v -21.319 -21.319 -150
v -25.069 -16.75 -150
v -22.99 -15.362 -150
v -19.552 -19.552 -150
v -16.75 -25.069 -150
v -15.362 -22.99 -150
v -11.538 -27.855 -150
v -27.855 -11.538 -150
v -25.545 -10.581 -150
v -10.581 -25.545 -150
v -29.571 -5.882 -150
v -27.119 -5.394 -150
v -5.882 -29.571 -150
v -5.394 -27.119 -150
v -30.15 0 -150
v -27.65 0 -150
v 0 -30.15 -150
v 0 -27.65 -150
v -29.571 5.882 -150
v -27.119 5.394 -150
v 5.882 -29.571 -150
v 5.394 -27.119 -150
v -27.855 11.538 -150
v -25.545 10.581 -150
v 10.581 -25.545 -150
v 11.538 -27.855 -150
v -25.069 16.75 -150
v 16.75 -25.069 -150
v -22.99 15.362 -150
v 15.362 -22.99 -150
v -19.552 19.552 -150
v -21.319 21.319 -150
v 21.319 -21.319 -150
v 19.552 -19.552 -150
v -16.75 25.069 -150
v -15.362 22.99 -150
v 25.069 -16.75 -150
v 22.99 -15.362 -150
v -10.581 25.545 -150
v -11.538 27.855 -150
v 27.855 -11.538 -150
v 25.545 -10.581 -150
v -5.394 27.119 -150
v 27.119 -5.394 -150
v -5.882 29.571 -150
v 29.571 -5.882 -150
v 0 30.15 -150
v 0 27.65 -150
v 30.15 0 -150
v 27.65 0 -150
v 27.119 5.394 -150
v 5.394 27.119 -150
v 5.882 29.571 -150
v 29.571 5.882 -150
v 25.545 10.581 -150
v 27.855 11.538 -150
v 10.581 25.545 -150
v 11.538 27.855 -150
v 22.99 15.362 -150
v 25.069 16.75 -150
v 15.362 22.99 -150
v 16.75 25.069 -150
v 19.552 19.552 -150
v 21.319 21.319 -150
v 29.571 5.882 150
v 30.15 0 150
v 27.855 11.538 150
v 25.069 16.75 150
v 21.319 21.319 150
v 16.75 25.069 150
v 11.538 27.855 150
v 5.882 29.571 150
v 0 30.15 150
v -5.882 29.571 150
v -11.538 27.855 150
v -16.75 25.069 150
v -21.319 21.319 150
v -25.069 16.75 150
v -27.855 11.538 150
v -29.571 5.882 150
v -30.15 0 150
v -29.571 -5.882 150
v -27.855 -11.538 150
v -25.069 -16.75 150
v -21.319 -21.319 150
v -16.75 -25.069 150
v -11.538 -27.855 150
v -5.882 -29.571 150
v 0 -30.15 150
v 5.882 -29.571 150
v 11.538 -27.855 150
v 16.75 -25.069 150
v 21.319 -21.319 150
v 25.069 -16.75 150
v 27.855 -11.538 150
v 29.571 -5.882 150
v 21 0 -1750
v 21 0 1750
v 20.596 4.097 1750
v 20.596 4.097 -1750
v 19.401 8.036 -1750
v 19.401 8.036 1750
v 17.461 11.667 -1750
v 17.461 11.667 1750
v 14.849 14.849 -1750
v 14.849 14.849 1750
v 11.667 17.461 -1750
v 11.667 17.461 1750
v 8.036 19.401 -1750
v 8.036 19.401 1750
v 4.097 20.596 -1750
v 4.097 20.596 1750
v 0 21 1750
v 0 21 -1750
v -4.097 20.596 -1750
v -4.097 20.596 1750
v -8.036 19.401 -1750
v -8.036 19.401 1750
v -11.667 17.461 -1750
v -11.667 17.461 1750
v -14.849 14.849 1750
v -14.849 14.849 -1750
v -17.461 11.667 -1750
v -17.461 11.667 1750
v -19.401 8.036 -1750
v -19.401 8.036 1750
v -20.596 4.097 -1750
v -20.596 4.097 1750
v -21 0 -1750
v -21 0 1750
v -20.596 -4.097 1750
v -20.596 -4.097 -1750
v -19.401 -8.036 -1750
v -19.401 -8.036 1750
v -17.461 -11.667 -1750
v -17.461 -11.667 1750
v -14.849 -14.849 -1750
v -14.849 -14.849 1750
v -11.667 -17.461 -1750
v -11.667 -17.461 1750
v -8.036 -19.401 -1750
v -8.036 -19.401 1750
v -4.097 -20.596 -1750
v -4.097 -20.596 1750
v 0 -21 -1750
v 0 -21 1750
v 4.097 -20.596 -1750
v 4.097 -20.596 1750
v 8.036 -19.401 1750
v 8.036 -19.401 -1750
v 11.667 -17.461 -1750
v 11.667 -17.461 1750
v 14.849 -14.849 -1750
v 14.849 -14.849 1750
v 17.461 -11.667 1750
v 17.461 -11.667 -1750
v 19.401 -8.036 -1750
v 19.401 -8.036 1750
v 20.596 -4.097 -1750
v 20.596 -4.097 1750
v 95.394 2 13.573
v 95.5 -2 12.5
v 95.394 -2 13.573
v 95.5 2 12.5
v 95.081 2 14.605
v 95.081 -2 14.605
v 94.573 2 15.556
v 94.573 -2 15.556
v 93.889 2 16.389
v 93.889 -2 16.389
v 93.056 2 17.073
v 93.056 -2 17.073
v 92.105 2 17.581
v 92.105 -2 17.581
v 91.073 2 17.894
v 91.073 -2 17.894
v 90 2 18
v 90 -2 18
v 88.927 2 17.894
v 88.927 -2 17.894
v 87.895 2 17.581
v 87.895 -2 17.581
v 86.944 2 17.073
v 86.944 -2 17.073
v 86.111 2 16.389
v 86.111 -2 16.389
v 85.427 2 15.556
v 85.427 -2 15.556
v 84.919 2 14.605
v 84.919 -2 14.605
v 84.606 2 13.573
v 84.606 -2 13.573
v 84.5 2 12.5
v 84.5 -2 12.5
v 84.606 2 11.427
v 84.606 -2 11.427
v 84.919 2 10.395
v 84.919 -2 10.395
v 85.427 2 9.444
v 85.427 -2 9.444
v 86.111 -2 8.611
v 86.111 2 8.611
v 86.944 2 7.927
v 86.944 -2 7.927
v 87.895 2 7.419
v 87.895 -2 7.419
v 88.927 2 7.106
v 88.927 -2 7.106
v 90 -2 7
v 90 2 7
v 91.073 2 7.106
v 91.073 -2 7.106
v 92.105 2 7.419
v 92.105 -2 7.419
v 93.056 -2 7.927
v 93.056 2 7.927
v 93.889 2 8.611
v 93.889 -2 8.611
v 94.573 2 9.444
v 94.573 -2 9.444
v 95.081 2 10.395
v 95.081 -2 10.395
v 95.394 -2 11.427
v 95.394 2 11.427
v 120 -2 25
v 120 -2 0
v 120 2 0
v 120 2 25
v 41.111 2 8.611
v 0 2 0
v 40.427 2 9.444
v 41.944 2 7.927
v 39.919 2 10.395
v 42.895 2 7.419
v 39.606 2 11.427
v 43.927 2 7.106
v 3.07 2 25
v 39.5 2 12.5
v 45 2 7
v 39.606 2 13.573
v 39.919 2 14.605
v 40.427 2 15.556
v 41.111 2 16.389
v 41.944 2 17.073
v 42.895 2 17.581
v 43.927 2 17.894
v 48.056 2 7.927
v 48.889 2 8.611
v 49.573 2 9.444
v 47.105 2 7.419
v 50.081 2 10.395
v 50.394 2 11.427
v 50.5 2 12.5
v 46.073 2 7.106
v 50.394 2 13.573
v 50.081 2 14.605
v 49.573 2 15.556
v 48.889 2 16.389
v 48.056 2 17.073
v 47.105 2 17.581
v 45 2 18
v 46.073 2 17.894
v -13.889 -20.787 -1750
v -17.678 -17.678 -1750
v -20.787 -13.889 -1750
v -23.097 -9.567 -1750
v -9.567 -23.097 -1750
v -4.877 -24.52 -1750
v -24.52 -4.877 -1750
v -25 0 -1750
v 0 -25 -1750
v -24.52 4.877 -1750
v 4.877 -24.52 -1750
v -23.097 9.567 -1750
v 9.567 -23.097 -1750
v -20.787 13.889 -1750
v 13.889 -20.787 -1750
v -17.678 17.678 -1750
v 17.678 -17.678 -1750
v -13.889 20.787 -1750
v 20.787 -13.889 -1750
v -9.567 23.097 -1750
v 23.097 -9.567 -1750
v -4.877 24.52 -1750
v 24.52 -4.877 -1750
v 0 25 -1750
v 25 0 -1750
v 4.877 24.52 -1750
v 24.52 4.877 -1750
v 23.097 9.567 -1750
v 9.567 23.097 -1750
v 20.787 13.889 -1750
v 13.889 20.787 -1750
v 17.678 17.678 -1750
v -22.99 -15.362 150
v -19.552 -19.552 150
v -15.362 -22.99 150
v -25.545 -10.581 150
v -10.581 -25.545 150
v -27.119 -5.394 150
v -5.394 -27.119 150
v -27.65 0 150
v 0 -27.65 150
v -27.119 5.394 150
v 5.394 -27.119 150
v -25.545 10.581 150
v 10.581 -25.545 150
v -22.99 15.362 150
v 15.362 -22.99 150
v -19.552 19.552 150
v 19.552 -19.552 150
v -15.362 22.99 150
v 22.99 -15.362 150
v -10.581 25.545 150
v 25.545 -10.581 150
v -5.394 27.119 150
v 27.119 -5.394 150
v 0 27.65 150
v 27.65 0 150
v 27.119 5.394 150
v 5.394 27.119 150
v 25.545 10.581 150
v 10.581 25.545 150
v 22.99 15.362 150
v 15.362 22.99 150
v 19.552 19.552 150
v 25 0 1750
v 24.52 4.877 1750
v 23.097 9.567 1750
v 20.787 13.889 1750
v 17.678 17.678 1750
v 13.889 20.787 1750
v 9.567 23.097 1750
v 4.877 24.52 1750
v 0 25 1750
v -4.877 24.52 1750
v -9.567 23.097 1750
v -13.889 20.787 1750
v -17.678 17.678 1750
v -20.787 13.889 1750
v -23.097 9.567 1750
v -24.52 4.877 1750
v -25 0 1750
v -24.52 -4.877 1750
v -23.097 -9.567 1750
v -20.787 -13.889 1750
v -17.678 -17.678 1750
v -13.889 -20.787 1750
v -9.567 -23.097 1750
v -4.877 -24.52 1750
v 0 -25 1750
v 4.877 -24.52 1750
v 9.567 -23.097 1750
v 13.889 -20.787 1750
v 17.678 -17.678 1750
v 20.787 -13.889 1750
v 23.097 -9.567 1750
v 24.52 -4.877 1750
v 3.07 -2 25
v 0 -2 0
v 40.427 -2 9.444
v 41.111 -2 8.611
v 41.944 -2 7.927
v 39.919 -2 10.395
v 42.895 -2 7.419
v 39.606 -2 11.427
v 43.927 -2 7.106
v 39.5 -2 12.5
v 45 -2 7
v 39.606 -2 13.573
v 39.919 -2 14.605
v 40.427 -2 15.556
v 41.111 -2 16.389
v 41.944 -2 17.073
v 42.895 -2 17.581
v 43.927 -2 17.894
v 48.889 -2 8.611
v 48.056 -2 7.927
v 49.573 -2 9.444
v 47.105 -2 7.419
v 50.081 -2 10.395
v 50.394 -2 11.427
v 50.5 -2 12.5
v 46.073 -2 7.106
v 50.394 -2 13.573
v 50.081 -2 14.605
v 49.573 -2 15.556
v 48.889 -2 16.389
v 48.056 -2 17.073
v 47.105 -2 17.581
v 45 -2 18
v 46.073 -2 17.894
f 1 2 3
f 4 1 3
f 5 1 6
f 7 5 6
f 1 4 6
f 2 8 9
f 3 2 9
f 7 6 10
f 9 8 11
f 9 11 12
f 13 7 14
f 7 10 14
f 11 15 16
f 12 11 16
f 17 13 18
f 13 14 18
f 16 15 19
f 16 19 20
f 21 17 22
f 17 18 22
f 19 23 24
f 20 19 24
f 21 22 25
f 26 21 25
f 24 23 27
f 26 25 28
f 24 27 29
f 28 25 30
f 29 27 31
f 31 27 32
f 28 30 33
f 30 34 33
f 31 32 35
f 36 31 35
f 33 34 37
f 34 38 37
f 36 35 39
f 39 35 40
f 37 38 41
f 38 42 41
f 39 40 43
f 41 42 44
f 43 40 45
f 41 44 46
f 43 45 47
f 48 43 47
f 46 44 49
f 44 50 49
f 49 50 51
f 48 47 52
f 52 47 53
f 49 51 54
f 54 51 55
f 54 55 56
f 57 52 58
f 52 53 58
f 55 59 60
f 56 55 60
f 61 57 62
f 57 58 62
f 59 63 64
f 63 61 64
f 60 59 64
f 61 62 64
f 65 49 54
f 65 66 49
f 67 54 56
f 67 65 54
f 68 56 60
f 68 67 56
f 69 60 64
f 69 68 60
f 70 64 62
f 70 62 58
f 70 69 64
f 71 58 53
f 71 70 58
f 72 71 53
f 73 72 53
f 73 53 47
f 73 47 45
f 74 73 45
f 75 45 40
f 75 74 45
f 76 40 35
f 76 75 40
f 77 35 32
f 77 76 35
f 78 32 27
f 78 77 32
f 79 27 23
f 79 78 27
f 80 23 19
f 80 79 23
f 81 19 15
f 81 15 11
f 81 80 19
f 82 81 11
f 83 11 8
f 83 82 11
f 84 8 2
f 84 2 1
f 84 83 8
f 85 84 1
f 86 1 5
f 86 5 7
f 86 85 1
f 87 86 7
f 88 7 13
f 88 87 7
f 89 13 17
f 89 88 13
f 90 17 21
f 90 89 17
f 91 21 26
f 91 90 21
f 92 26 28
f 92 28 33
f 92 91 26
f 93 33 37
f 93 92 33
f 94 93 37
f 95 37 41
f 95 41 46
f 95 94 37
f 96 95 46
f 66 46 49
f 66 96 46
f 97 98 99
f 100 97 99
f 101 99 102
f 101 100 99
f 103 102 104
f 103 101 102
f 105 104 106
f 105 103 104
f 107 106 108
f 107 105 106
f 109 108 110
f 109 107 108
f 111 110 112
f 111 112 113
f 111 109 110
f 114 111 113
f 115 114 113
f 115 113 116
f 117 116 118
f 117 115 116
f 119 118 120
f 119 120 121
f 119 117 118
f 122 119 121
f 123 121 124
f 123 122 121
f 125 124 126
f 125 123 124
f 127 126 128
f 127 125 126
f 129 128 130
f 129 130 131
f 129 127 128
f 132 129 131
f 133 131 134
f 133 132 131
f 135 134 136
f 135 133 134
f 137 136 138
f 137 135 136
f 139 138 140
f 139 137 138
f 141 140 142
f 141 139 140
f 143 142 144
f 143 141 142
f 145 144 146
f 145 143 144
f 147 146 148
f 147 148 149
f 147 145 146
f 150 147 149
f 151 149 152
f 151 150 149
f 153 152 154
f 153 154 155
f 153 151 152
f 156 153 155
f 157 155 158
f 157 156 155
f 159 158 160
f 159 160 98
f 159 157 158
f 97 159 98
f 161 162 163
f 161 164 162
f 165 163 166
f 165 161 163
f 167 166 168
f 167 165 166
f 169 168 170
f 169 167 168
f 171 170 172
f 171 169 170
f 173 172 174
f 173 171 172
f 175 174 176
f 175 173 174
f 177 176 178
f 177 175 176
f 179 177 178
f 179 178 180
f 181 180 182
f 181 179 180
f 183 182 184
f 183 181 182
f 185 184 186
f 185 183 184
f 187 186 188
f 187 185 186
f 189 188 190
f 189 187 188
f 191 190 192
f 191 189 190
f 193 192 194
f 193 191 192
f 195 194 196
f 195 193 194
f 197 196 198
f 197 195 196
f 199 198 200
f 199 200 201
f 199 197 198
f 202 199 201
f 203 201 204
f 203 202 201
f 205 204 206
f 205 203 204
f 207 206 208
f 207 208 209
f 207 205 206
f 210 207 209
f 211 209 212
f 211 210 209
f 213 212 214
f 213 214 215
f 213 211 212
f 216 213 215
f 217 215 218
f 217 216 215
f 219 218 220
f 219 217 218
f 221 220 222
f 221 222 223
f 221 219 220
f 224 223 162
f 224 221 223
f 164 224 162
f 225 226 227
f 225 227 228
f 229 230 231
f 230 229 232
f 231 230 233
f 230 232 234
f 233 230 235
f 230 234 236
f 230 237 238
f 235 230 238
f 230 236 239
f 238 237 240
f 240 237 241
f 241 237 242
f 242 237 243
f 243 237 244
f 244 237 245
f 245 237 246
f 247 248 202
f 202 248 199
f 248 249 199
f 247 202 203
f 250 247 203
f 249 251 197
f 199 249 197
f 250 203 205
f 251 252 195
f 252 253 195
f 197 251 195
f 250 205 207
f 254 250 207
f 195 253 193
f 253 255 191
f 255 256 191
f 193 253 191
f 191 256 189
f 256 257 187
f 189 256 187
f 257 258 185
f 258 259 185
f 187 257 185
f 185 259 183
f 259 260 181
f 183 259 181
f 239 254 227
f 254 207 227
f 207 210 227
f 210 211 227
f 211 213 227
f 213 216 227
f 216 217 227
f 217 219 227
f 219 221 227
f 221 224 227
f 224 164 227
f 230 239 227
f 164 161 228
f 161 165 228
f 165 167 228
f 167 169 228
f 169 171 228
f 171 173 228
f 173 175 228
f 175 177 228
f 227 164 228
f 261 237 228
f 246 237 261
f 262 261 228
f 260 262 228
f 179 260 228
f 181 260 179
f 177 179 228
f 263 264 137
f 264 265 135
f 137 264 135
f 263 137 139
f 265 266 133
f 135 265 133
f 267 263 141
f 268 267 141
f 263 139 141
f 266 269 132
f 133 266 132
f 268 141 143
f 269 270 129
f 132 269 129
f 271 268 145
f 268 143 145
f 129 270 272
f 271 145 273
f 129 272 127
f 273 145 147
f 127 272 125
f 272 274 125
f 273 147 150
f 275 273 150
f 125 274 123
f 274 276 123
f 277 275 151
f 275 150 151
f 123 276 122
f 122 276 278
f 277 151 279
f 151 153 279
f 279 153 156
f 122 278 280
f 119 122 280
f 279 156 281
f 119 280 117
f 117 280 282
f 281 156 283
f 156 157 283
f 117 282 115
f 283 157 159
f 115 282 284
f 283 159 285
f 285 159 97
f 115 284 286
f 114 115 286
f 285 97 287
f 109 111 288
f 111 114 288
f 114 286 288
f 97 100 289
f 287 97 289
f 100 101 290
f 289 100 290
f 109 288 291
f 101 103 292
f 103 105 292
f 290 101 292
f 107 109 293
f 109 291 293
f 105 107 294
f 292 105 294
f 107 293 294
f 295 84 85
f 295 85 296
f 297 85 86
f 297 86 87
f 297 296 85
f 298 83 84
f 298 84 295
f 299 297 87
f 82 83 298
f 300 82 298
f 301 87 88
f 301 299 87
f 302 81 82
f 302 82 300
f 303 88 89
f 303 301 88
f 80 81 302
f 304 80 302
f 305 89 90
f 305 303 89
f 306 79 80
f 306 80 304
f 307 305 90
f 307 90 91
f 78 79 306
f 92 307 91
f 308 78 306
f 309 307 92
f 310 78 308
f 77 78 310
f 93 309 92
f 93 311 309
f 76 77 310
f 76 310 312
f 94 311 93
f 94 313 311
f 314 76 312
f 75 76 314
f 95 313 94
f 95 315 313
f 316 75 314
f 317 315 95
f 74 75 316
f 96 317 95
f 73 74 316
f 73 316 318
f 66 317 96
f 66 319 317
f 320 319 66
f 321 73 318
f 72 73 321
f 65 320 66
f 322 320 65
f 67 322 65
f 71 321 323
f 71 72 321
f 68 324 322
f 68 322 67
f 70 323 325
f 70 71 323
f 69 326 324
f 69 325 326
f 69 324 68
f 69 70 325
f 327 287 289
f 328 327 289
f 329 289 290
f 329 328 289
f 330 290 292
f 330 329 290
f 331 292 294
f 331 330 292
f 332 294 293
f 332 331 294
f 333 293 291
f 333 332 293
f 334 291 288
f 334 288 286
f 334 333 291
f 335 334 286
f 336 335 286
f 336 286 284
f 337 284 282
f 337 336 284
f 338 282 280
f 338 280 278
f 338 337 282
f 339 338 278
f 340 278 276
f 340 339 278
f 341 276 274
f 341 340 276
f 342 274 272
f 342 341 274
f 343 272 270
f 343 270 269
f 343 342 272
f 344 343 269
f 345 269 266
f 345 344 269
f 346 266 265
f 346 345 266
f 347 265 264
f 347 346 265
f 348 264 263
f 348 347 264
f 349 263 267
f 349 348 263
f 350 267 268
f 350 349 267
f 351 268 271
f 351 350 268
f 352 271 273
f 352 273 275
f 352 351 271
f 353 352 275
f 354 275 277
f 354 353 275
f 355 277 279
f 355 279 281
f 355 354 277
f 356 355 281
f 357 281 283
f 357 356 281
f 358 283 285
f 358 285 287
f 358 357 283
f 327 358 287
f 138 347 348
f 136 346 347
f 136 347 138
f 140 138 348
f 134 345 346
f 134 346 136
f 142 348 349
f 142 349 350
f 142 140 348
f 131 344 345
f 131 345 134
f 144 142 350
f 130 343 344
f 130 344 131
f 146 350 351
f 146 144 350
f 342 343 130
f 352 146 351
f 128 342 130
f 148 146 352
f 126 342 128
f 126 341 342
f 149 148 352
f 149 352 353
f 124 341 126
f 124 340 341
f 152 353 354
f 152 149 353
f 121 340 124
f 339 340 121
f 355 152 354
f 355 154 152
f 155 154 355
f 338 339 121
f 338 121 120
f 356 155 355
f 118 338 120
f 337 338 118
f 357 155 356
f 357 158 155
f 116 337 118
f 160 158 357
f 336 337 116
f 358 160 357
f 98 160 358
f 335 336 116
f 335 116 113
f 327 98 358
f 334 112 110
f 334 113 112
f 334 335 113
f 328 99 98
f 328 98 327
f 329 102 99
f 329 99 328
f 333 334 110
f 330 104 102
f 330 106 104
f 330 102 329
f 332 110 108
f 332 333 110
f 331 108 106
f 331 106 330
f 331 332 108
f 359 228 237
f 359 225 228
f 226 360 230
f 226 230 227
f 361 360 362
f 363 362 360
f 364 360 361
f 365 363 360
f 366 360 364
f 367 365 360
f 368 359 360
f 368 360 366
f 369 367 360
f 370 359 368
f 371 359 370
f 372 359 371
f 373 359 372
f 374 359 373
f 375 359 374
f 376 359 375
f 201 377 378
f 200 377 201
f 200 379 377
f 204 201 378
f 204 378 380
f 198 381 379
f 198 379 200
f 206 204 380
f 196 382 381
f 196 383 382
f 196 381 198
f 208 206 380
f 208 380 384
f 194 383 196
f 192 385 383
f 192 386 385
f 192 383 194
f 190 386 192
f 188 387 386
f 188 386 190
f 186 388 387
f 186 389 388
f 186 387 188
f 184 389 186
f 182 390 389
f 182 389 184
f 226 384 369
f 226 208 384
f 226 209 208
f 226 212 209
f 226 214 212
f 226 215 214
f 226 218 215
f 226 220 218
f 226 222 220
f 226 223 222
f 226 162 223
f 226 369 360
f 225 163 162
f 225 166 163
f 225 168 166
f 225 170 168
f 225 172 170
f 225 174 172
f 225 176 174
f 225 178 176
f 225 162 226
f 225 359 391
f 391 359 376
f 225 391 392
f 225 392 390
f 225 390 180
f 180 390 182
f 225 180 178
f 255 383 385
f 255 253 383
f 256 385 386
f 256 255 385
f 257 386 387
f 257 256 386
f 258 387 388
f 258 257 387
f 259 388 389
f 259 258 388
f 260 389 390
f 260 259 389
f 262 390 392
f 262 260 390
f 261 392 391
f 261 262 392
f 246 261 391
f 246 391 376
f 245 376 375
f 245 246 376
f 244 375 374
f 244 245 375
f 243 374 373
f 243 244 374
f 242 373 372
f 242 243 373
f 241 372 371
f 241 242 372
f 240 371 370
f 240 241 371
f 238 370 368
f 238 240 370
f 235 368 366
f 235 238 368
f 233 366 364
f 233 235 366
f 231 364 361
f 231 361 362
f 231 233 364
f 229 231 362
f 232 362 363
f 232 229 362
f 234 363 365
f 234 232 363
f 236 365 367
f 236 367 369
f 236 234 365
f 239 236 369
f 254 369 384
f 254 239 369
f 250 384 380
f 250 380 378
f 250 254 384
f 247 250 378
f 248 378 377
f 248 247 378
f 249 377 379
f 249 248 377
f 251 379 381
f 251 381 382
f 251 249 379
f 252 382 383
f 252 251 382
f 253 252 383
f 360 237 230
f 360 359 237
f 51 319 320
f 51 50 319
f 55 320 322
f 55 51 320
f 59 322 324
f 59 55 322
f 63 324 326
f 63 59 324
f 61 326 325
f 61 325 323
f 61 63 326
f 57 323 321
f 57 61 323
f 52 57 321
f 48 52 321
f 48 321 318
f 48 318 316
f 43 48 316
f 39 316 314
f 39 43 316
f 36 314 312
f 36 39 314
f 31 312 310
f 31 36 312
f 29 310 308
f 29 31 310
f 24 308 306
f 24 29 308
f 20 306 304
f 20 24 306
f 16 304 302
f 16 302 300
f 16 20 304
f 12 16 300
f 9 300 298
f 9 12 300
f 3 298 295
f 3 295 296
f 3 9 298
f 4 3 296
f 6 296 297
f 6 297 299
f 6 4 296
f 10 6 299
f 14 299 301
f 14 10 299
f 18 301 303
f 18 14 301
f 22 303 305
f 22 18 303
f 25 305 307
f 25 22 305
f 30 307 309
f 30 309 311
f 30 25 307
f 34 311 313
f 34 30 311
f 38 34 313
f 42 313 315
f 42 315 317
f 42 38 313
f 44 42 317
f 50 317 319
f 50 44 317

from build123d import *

# Parameters (mm, degrees)
F0_R     = 25
F0_R_2   = 21
F1_DEPTH = 1750
F2_R     = 30.15
F2_R_2   = 27.65
F3_DEPTH = 150
F4_R     = 5.5
F5_DEPTH = 2


with BuildPart() as f1:
    # F0 (on Top) → F1 (new body, symmetric)
    with BuildSketch(Plane.XY):
        Circle(F0_R)
        Circle(F0_R_2, mode=Mode.SUBTRACT)
    extrude(amount=F1_DEPTH, both=True)


with BuildPart() as f3:
    # F2 (on Top) → F3 (new body, symmetric)
    with BuildSketch(Plane.XY):
        Circle(F2_R)
        Circle(F2_R_2, mode=Mode.SUBTRACT)
    extrude(amount=F3_DEPTH, both=True)


with BuildPart() as f5:
    # F4 (on Front) → F5 (new body, symmetric)
    with BuildSketch(Plane.XZ):
        Polygon((3.069614, 25), (0, 0), (120, 0), (120, 25), align=None)
        with Locations((45, 12.5)):
            Circle(F4_R, mode=Mode.SUBTRACT)
        with Locations((90, 12.5)):
            Circle(F4_R, mode=Mode.SUBTRACT)
    extrude(amount=F5_DEPTH, both=True)


solid = Compound([f1.part, f3.part, f5.part])
